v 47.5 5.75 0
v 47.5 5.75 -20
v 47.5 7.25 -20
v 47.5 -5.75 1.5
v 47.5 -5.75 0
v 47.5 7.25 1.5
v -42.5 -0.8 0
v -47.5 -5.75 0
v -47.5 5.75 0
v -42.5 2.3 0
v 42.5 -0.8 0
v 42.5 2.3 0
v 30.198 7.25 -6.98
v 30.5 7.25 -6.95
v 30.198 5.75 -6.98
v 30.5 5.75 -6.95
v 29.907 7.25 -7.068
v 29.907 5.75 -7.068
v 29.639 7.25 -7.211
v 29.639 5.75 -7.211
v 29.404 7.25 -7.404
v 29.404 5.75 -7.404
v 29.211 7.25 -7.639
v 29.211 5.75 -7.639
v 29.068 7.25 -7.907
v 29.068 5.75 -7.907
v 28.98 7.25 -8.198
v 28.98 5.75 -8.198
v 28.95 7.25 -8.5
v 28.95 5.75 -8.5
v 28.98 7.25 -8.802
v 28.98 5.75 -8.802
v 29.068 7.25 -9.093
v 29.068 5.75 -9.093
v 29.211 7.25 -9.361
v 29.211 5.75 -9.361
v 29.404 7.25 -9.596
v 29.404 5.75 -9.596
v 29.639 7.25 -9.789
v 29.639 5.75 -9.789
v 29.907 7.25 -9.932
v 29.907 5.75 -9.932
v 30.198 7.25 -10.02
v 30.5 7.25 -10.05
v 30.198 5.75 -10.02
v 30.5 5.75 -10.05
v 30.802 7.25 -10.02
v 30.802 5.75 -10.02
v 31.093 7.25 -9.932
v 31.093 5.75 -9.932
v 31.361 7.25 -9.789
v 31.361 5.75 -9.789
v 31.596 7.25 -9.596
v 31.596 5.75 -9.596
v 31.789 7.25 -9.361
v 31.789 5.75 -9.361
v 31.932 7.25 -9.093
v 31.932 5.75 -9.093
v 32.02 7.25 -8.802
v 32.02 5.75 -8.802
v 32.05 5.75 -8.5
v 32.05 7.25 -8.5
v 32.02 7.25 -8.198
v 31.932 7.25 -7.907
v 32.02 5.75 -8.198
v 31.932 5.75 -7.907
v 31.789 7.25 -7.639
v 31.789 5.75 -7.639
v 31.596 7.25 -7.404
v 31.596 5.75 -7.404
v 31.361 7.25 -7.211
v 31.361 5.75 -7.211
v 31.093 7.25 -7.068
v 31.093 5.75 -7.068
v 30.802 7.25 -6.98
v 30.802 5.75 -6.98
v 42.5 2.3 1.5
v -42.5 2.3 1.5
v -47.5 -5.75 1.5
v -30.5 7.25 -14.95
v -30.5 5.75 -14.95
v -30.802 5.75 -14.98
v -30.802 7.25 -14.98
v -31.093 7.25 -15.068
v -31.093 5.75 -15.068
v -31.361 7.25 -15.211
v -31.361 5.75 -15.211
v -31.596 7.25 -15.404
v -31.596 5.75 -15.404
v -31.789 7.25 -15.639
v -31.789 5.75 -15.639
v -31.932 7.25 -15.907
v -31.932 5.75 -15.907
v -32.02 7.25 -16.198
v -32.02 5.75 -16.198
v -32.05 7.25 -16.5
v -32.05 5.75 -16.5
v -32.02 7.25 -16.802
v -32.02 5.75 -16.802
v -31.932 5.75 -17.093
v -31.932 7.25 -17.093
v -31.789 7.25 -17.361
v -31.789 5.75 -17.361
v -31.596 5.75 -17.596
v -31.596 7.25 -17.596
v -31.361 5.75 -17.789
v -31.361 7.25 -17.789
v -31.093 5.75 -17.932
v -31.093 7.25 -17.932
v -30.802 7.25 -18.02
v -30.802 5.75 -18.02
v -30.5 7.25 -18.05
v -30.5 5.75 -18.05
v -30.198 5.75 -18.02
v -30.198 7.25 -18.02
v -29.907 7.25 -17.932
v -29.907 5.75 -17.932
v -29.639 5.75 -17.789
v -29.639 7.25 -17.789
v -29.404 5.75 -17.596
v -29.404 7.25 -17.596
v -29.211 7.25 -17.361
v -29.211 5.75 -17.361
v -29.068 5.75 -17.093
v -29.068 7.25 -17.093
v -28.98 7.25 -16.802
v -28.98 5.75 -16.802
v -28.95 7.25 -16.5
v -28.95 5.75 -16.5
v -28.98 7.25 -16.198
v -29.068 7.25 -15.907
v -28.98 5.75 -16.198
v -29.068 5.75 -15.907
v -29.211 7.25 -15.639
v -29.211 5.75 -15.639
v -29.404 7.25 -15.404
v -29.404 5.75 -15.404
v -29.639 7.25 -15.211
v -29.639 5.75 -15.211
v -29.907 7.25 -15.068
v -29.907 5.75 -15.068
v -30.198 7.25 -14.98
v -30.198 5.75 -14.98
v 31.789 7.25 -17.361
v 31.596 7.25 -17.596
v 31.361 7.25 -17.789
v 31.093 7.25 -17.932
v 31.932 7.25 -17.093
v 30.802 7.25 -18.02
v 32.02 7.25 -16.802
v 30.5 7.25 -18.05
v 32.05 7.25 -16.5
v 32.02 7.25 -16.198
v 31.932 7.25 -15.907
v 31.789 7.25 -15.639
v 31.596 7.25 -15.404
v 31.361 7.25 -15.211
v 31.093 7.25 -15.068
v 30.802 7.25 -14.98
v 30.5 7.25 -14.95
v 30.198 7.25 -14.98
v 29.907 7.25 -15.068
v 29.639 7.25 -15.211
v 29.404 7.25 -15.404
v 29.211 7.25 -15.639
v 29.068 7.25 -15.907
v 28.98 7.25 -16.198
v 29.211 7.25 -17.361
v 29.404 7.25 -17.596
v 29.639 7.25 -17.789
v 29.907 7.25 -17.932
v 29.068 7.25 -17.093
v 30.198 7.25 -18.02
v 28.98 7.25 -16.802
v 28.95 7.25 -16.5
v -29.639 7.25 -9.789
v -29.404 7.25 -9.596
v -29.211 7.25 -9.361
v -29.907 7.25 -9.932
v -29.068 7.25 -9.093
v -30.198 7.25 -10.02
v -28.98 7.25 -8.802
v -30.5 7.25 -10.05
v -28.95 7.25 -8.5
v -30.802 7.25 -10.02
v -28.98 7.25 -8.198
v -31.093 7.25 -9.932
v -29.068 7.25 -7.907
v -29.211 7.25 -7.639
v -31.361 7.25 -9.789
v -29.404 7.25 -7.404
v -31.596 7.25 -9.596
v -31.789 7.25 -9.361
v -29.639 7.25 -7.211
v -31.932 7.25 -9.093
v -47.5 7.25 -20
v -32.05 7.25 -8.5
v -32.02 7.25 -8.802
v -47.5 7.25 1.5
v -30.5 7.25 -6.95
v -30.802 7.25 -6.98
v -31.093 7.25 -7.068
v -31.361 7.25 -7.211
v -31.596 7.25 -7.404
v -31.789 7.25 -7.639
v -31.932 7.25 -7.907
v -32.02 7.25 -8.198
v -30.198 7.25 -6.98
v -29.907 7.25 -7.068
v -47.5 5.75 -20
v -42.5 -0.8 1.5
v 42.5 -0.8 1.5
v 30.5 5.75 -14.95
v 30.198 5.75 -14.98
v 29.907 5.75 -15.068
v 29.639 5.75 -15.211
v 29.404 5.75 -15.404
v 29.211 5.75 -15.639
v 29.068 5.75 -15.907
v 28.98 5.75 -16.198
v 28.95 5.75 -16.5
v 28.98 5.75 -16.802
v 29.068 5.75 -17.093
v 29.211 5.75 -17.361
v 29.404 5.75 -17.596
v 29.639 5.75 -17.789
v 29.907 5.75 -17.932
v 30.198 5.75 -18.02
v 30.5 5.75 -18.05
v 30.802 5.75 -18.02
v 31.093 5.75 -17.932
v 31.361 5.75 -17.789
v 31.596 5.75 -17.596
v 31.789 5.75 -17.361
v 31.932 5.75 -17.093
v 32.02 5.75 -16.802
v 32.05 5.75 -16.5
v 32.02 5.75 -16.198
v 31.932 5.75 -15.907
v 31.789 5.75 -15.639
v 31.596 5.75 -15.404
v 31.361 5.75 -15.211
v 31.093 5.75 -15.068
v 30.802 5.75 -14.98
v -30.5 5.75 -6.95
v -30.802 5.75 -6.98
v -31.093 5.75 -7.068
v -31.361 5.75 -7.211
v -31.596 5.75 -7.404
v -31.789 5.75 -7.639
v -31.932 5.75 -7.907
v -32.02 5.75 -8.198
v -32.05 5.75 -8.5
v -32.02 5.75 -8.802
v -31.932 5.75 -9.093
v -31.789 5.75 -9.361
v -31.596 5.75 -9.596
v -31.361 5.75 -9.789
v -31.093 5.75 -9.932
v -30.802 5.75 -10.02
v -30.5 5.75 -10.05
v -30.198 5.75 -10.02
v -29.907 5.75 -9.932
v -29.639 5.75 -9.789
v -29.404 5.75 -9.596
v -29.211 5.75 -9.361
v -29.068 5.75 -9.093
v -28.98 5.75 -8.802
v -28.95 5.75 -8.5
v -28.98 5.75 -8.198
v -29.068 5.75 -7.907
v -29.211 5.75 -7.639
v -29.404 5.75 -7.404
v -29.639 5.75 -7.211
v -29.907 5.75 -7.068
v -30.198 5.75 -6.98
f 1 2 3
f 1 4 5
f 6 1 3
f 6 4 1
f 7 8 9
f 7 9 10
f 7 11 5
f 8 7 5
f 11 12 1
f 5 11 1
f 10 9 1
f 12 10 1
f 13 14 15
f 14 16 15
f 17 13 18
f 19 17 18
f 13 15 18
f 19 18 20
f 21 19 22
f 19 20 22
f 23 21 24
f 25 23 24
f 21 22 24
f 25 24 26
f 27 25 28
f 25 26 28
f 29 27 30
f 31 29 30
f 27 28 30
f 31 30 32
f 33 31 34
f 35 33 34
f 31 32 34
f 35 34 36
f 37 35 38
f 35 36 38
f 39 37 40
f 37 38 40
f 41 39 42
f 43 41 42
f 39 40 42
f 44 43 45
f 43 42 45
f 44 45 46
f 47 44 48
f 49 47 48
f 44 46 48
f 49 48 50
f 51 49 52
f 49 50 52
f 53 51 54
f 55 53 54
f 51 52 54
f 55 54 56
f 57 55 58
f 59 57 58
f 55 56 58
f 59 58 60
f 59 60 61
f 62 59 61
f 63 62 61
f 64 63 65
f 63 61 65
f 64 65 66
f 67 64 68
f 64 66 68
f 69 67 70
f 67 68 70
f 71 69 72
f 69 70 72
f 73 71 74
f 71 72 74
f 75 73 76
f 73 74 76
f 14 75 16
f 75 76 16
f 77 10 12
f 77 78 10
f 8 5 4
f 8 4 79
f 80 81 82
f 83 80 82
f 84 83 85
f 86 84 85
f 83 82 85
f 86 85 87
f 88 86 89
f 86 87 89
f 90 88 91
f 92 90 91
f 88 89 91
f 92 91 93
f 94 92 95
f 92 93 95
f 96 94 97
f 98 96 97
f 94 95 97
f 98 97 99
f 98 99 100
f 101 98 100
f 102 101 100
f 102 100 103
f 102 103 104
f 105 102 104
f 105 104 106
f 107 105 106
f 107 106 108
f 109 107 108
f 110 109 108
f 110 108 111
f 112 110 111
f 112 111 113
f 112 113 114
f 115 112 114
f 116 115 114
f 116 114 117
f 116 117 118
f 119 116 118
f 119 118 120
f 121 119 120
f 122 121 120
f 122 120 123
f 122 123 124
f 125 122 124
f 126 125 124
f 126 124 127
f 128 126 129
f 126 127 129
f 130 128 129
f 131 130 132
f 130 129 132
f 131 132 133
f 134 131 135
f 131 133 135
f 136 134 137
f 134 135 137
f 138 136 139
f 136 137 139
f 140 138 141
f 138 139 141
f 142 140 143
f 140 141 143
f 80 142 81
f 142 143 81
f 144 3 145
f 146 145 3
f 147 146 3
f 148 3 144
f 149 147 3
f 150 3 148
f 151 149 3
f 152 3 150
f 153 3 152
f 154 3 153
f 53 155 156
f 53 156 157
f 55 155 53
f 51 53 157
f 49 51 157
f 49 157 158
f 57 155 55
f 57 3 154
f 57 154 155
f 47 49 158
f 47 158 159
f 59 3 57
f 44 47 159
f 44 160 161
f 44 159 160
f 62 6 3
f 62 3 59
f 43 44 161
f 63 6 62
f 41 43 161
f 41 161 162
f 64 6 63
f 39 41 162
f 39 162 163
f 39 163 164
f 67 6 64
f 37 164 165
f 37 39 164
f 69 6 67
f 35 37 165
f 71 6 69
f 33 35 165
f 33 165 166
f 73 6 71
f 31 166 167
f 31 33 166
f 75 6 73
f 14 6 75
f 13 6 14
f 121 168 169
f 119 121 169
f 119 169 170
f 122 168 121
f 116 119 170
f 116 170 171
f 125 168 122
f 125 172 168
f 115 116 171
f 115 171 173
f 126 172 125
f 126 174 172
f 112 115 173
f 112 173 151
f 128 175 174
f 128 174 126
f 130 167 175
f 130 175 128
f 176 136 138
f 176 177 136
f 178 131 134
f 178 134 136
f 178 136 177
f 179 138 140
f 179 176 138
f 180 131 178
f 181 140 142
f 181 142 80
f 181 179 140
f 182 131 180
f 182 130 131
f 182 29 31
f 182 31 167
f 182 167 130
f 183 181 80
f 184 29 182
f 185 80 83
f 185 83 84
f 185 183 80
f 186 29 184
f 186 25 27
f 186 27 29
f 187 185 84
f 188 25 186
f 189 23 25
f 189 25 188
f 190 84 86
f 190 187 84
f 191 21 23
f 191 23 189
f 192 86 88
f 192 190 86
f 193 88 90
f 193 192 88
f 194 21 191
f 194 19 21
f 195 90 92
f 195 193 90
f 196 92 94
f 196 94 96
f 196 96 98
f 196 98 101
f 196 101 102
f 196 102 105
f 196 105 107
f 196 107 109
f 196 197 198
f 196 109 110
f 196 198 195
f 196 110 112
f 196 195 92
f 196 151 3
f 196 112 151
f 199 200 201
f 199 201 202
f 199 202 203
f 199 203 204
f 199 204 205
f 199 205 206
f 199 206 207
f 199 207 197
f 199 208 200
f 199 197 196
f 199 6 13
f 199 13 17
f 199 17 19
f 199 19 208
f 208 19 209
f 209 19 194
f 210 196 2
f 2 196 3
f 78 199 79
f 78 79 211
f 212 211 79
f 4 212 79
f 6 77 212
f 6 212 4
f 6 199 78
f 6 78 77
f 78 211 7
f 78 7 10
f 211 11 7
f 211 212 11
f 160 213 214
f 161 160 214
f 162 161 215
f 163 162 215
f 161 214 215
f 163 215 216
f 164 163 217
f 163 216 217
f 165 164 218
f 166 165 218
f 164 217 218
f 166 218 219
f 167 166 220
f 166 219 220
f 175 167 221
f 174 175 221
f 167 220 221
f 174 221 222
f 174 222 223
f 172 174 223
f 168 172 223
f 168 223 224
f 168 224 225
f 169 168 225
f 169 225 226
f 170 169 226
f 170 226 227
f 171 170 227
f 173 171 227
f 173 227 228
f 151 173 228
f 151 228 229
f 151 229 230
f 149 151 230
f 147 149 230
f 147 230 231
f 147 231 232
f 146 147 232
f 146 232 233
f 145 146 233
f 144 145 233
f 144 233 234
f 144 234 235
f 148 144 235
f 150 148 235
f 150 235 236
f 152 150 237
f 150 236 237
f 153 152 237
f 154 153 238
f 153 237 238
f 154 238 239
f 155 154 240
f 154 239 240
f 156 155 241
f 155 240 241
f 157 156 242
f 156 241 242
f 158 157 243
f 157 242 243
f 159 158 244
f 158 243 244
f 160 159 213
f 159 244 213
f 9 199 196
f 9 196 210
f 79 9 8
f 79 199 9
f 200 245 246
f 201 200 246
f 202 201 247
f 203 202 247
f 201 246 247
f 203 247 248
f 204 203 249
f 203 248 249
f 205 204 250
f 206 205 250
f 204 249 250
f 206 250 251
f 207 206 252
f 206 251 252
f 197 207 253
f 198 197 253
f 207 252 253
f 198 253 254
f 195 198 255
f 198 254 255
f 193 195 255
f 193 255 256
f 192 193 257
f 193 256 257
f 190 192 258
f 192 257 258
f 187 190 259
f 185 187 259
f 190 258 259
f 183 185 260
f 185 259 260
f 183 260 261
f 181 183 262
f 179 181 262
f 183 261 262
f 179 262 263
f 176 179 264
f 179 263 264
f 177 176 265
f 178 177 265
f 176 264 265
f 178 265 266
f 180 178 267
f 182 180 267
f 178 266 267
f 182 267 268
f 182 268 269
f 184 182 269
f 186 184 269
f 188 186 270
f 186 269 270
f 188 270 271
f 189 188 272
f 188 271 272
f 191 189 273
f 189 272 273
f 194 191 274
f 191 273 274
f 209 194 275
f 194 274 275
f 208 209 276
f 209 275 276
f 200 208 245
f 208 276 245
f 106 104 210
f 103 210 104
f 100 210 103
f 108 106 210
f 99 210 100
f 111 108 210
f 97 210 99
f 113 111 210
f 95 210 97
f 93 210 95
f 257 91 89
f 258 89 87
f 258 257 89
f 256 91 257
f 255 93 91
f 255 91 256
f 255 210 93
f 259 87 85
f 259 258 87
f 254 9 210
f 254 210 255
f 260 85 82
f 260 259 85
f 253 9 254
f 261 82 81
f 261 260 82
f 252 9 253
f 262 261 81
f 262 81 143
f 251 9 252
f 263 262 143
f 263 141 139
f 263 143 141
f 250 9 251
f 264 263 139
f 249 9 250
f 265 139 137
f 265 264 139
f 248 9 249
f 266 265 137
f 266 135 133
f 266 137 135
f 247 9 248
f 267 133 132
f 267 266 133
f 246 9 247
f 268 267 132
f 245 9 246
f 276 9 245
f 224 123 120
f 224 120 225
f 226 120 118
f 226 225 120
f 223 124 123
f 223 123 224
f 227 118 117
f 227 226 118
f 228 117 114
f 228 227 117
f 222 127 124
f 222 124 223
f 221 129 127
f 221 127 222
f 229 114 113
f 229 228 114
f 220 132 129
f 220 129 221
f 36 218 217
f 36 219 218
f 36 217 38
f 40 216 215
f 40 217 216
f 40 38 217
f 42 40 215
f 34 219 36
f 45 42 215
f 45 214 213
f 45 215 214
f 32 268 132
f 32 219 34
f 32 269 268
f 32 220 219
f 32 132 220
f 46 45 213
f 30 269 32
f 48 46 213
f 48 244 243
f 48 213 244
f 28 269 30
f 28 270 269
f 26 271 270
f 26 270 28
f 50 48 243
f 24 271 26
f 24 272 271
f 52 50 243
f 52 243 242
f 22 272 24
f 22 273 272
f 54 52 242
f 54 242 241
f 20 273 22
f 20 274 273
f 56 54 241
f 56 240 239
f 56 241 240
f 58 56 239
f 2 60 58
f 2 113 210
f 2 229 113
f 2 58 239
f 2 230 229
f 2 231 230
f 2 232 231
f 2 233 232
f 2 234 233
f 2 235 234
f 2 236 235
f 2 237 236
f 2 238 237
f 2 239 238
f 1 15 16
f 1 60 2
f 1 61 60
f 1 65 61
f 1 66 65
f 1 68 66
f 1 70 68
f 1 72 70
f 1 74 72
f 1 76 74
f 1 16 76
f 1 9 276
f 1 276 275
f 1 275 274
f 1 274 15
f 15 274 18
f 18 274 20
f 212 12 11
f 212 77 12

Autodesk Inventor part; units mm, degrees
ref_plane "YZ Plane" through (0, 0, 0) normal (1, 0, 0) x (0, 1, 0)
ref_plane "XZ Plane" through (0, 0, 0) normal (0, 1, 0) x (-1, 0, 0)
ref_plane "XY Plane" through (0, 0, 0) normal (0, 0, 1) x (1, 0, 0)
sketch "スケッチ1" plane through (0, 0, 0) normal (0, 0, 1) x (1, 0, 0)
  line L0 (-47.5, 5.75) -> (47.5, 5.75)
  line L1 (47.5, 5.75) -> (47.5, -5.75)
  line L2 (47.5, -5.75) -> (-47.5, -5.75)
  line L3 (-47.5, -5.75) -> (-47.5, 5.75)
  line L4 (-47.5, 5.75) -> (47.5, -5.75) construction
  line L5 (47.5, 5.75) -> (-47.5, -5.75) construction
  point P0 (0, 0)
  dimension "d0" = 11.5
  dimension "d1" = 95
extrude "押し出し1" add sketch "スケッチ1" along normal blind 1.5
sketch "スケッチ2" plane through (0, 0, 1.5) normal (0, 0, 1) x (1, 0, 0)
  line L0 (-42.5, 2.3) -> (42.5, 2.3)
  line L1 (42.5, 2.3) -> (42.5, -0.8)
  line L2 (42.5, -0.8) -> (-42.5, -0.8)
  line L3 (-42.5, -0.8) -> (-42.5, 2.3)
  line L4 (-47.5, -5.75) -> (47.5, -5.75) projected
  line L5 (47.5, -5.75) -> (47.5, 5.75) projected
  point P0 (0, 0)
  dimension "d8" = 3.1
  dimension "d9" = 85
  dimension "d10" = 4.95
  dimension "d11" = 5
extrude "押し出し2" cut sketch "スケッチ2" against normal blind 1.5
sketch "スケッチ3" plane through (0, 0, 1.5) normal (0, 0, 1) x (1, 0, 0)
  line L0 (-47.5, 5.75) -> (47.5, 5.75)
  line L1 (47.5, 5.75) -> (47.5, 7.25)
  line L2 (47.5, 7.25) -> (-47.5, 7.25)
  line L3 (-47.5, 7.25) -> (-47.5, 5.75)
  point P0 (0, 0)
  dimension "d14" = 95
  dimension "d15" = 1.5
extrude "押し出し3" add sketch "スケッチ3" against normal blind 21.5
sketch "スケッチ4" plane through (-47.5, 7.25, 1.5) normal (0, 1, 0) x (1, 0, 0)
  line L0 (95, 0) -> (0, 0) projected
  line L1 (0, 21.5) -> (95, 21.5) projected
  point P0 (47.5, 1.5)
  point P1 (17, 10)
  point P2 (78, 10)
  point P3 (17, 18)
  point P4 (78, 18)
  dimension "d18" = 30.5
  dimension "d19" = 30.5
  dimension "d21" = 8
  dimension "d29" = 3.5
hole "穴1" at (-30.5, 7.25, -8.5) at (30.5, 7.25, -8.5) at (-30.5, 7.25, -16.5) at (30.5, 7.25, -16.5) direction (0, -1, 0) diameter 3.1 end through all
equation "\"d27\" = Thickness"
equation "\"BendRadius\" = Thickness"
equation "\"BendReliefWidth\" = Thickness"
equation "\"BendReliefDepth\" = 0.5 * Thickness"
equation "\"CornerReliefSize\" = 4 * Thickness"
equation "\"MinimumRemnant\" = 2 * Thickness"
equation "\"TransitionRadius\" = BendRadius"
equation "\"JacobiRadiusSize\" = BendRadius"
equation "\"GapSize\" = Thickness"
equation "\"Thickness\" = 0.5"
properties part number "Fork 2 ver2" material "アルミニウム 5052 H32"
